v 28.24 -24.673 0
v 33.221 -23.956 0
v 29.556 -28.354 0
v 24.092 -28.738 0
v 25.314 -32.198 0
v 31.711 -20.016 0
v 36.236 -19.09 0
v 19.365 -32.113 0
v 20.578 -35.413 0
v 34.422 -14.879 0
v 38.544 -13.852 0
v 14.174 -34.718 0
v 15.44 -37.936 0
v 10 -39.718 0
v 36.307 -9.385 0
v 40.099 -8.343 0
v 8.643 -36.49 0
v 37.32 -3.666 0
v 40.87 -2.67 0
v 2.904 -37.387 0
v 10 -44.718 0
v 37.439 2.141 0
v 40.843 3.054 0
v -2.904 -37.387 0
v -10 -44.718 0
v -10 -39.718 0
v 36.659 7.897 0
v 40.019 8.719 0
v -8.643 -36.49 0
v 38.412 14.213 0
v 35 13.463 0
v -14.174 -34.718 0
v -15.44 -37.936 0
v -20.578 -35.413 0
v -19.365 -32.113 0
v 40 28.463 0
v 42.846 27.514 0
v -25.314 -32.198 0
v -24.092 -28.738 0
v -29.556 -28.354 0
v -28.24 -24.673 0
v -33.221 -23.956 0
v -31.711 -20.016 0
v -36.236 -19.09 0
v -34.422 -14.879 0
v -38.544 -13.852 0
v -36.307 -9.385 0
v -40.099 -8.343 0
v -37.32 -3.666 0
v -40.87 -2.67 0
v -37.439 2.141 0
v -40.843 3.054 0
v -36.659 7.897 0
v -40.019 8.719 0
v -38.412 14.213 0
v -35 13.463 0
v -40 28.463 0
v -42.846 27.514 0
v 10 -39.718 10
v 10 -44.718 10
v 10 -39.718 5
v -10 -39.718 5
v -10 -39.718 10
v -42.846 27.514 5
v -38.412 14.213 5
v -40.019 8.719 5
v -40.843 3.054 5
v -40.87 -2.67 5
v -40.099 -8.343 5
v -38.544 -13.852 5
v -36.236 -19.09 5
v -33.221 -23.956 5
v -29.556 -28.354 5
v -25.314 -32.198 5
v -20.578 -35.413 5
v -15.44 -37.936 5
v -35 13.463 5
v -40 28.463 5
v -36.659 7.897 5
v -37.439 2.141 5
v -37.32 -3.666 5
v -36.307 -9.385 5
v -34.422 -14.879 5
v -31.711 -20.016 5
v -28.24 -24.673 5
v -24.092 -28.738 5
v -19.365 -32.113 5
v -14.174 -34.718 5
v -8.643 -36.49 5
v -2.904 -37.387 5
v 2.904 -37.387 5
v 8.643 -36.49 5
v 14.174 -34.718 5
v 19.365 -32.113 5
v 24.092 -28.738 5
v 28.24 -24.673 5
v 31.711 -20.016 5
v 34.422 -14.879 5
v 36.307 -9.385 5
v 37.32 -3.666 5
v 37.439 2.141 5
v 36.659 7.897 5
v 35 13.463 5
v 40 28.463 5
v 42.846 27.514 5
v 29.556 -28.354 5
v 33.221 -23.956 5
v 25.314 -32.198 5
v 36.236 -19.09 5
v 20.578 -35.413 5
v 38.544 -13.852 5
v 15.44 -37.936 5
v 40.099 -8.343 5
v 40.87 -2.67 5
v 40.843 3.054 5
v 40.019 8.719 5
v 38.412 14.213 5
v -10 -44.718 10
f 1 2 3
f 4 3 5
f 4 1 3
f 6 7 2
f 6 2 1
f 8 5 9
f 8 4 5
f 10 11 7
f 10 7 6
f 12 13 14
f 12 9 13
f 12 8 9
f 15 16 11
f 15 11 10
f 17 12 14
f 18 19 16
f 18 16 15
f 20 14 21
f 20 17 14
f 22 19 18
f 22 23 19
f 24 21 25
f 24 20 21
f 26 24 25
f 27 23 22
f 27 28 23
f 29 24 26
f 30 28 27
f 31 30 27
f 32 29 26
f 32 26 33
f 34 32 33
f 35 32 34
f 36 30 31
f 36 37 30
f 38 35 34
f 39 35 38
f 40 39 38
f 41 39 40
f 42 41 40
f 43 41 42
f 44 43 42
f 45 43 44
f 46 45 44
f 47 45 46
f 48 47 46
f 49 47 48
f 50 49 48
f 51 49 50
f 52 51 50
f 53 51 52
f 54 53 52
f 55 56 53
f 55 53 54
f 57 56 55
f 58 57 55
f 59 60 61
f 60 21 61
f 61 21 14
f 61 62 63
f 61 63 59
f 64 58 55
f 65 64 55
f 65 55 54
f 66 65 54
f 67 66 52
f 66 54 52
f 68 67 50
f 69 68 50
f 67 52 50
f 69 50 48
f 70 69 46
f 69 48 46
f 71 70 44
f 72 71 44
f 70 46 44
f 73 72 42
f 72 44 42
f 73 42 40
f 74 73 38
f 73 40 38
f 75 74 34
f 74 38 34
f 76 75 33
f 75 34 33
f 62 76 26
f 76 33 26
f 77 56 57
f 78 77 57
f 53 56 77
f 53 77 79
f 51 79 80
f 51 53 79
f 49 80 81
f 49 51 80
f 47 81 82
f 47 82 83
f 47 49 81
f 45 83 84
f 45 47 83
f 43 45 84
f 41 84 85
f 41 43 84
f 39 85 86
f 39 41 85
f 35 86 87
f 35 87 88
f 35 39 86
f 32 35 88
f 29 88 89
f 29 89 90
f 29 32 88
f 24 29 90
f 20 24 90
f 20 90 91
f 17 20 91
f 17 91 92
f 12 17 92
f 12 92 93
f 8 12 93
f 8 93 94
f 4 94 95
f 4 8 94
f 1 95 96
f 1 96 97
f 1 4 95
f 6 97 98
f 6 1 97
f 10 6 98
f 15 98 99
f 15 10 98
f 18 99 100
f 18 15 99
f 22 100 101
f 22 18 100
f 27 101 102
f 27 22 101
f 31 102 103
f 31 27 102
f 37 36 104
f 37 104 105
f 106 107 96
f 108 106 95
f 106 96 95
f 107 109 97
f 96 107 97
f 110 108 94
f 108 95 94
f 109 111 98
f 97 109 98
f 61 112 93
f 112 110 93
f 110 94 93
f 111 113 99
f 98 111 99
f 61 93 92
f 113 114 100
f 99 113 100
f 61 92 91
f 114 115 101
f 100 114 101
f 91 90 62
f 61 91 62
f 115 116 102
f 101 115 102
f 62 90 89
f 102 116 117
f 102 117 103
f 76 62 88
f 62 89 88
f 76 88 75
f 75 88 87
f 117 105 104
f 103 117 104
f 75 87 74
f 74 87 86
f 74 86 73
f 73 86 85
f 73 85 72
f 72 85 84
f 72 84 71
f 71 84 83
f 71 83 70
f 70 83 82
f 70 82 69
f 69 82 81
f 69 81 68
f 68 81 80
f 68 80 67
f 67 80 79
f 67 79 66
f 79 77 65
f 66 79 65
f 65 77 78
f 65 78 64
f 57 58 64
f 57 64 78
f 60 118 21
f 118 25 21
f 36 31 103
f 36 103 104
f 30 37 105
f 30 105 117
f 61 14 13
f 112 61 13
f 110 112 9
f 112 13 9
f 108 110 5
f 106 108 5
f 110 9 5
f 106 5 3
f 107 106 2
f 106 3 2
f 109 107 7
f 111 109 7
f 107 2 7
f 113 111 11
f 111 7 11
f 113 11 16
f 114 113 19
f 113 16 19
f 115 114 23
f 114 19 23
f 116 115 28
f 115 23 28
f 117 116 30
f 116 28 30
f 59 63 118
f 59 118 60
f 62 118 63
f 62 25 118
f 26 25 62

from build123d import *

# Parameters (mm, degrees)
PAD_DEPTH    = 5
SKETCH001_W  = 20
SKETCH001_H  = 5
PAD001_DEPTH = 5


with BuildPart() as part:
    # Sketch → Pad (new body)
    with BuildSketch(Plane.XY):
        with BuildLine():
            ThreePointArc((-35, 13.462912), (0, -37.5), (35, 13.462912))
            Line((35, 13.462912), (40, 28.462912))
            Line((40, 28.462912), (42.84605, 27.514229))
            Line((42.84605, 27.514229), (38.412275, 14.212903))
            ThreePointArc((10, -39.717873), (36.236297, -19.090317), (38.412275, 14.212903))
            Line((10, -44.717873), (10, -39.717873))
            Line((-10, -44.717873), (10, -44.717873))
            Line((-10, -39.717873), (-10, -44.717873))
            ThreePointArc((-38.412275, 14.212903), (-36.236297, -19.090317), (-10, -39.717873))
            Line((-42.84605, 27.514229), (-38.412275, 14.212903))
            Line((-42.84605, 27.514229), (-40, 28.462912))
            Line((-35, 13.462912), (-40, 28.462912))
        make_face()
    extrude(amount=PAD_DEPTH)

    # Sketch001 (on Face14 of Pad) → Pad001 (join)
    with BuildSketch(Plane.XY.offset(5)):
        with Locations((0, -42.217873)):
            Rectangle(SKETCH001_W, SKETCH001_H)
    extrude(amount=PAD001_DEPTH)


solid = part.part
